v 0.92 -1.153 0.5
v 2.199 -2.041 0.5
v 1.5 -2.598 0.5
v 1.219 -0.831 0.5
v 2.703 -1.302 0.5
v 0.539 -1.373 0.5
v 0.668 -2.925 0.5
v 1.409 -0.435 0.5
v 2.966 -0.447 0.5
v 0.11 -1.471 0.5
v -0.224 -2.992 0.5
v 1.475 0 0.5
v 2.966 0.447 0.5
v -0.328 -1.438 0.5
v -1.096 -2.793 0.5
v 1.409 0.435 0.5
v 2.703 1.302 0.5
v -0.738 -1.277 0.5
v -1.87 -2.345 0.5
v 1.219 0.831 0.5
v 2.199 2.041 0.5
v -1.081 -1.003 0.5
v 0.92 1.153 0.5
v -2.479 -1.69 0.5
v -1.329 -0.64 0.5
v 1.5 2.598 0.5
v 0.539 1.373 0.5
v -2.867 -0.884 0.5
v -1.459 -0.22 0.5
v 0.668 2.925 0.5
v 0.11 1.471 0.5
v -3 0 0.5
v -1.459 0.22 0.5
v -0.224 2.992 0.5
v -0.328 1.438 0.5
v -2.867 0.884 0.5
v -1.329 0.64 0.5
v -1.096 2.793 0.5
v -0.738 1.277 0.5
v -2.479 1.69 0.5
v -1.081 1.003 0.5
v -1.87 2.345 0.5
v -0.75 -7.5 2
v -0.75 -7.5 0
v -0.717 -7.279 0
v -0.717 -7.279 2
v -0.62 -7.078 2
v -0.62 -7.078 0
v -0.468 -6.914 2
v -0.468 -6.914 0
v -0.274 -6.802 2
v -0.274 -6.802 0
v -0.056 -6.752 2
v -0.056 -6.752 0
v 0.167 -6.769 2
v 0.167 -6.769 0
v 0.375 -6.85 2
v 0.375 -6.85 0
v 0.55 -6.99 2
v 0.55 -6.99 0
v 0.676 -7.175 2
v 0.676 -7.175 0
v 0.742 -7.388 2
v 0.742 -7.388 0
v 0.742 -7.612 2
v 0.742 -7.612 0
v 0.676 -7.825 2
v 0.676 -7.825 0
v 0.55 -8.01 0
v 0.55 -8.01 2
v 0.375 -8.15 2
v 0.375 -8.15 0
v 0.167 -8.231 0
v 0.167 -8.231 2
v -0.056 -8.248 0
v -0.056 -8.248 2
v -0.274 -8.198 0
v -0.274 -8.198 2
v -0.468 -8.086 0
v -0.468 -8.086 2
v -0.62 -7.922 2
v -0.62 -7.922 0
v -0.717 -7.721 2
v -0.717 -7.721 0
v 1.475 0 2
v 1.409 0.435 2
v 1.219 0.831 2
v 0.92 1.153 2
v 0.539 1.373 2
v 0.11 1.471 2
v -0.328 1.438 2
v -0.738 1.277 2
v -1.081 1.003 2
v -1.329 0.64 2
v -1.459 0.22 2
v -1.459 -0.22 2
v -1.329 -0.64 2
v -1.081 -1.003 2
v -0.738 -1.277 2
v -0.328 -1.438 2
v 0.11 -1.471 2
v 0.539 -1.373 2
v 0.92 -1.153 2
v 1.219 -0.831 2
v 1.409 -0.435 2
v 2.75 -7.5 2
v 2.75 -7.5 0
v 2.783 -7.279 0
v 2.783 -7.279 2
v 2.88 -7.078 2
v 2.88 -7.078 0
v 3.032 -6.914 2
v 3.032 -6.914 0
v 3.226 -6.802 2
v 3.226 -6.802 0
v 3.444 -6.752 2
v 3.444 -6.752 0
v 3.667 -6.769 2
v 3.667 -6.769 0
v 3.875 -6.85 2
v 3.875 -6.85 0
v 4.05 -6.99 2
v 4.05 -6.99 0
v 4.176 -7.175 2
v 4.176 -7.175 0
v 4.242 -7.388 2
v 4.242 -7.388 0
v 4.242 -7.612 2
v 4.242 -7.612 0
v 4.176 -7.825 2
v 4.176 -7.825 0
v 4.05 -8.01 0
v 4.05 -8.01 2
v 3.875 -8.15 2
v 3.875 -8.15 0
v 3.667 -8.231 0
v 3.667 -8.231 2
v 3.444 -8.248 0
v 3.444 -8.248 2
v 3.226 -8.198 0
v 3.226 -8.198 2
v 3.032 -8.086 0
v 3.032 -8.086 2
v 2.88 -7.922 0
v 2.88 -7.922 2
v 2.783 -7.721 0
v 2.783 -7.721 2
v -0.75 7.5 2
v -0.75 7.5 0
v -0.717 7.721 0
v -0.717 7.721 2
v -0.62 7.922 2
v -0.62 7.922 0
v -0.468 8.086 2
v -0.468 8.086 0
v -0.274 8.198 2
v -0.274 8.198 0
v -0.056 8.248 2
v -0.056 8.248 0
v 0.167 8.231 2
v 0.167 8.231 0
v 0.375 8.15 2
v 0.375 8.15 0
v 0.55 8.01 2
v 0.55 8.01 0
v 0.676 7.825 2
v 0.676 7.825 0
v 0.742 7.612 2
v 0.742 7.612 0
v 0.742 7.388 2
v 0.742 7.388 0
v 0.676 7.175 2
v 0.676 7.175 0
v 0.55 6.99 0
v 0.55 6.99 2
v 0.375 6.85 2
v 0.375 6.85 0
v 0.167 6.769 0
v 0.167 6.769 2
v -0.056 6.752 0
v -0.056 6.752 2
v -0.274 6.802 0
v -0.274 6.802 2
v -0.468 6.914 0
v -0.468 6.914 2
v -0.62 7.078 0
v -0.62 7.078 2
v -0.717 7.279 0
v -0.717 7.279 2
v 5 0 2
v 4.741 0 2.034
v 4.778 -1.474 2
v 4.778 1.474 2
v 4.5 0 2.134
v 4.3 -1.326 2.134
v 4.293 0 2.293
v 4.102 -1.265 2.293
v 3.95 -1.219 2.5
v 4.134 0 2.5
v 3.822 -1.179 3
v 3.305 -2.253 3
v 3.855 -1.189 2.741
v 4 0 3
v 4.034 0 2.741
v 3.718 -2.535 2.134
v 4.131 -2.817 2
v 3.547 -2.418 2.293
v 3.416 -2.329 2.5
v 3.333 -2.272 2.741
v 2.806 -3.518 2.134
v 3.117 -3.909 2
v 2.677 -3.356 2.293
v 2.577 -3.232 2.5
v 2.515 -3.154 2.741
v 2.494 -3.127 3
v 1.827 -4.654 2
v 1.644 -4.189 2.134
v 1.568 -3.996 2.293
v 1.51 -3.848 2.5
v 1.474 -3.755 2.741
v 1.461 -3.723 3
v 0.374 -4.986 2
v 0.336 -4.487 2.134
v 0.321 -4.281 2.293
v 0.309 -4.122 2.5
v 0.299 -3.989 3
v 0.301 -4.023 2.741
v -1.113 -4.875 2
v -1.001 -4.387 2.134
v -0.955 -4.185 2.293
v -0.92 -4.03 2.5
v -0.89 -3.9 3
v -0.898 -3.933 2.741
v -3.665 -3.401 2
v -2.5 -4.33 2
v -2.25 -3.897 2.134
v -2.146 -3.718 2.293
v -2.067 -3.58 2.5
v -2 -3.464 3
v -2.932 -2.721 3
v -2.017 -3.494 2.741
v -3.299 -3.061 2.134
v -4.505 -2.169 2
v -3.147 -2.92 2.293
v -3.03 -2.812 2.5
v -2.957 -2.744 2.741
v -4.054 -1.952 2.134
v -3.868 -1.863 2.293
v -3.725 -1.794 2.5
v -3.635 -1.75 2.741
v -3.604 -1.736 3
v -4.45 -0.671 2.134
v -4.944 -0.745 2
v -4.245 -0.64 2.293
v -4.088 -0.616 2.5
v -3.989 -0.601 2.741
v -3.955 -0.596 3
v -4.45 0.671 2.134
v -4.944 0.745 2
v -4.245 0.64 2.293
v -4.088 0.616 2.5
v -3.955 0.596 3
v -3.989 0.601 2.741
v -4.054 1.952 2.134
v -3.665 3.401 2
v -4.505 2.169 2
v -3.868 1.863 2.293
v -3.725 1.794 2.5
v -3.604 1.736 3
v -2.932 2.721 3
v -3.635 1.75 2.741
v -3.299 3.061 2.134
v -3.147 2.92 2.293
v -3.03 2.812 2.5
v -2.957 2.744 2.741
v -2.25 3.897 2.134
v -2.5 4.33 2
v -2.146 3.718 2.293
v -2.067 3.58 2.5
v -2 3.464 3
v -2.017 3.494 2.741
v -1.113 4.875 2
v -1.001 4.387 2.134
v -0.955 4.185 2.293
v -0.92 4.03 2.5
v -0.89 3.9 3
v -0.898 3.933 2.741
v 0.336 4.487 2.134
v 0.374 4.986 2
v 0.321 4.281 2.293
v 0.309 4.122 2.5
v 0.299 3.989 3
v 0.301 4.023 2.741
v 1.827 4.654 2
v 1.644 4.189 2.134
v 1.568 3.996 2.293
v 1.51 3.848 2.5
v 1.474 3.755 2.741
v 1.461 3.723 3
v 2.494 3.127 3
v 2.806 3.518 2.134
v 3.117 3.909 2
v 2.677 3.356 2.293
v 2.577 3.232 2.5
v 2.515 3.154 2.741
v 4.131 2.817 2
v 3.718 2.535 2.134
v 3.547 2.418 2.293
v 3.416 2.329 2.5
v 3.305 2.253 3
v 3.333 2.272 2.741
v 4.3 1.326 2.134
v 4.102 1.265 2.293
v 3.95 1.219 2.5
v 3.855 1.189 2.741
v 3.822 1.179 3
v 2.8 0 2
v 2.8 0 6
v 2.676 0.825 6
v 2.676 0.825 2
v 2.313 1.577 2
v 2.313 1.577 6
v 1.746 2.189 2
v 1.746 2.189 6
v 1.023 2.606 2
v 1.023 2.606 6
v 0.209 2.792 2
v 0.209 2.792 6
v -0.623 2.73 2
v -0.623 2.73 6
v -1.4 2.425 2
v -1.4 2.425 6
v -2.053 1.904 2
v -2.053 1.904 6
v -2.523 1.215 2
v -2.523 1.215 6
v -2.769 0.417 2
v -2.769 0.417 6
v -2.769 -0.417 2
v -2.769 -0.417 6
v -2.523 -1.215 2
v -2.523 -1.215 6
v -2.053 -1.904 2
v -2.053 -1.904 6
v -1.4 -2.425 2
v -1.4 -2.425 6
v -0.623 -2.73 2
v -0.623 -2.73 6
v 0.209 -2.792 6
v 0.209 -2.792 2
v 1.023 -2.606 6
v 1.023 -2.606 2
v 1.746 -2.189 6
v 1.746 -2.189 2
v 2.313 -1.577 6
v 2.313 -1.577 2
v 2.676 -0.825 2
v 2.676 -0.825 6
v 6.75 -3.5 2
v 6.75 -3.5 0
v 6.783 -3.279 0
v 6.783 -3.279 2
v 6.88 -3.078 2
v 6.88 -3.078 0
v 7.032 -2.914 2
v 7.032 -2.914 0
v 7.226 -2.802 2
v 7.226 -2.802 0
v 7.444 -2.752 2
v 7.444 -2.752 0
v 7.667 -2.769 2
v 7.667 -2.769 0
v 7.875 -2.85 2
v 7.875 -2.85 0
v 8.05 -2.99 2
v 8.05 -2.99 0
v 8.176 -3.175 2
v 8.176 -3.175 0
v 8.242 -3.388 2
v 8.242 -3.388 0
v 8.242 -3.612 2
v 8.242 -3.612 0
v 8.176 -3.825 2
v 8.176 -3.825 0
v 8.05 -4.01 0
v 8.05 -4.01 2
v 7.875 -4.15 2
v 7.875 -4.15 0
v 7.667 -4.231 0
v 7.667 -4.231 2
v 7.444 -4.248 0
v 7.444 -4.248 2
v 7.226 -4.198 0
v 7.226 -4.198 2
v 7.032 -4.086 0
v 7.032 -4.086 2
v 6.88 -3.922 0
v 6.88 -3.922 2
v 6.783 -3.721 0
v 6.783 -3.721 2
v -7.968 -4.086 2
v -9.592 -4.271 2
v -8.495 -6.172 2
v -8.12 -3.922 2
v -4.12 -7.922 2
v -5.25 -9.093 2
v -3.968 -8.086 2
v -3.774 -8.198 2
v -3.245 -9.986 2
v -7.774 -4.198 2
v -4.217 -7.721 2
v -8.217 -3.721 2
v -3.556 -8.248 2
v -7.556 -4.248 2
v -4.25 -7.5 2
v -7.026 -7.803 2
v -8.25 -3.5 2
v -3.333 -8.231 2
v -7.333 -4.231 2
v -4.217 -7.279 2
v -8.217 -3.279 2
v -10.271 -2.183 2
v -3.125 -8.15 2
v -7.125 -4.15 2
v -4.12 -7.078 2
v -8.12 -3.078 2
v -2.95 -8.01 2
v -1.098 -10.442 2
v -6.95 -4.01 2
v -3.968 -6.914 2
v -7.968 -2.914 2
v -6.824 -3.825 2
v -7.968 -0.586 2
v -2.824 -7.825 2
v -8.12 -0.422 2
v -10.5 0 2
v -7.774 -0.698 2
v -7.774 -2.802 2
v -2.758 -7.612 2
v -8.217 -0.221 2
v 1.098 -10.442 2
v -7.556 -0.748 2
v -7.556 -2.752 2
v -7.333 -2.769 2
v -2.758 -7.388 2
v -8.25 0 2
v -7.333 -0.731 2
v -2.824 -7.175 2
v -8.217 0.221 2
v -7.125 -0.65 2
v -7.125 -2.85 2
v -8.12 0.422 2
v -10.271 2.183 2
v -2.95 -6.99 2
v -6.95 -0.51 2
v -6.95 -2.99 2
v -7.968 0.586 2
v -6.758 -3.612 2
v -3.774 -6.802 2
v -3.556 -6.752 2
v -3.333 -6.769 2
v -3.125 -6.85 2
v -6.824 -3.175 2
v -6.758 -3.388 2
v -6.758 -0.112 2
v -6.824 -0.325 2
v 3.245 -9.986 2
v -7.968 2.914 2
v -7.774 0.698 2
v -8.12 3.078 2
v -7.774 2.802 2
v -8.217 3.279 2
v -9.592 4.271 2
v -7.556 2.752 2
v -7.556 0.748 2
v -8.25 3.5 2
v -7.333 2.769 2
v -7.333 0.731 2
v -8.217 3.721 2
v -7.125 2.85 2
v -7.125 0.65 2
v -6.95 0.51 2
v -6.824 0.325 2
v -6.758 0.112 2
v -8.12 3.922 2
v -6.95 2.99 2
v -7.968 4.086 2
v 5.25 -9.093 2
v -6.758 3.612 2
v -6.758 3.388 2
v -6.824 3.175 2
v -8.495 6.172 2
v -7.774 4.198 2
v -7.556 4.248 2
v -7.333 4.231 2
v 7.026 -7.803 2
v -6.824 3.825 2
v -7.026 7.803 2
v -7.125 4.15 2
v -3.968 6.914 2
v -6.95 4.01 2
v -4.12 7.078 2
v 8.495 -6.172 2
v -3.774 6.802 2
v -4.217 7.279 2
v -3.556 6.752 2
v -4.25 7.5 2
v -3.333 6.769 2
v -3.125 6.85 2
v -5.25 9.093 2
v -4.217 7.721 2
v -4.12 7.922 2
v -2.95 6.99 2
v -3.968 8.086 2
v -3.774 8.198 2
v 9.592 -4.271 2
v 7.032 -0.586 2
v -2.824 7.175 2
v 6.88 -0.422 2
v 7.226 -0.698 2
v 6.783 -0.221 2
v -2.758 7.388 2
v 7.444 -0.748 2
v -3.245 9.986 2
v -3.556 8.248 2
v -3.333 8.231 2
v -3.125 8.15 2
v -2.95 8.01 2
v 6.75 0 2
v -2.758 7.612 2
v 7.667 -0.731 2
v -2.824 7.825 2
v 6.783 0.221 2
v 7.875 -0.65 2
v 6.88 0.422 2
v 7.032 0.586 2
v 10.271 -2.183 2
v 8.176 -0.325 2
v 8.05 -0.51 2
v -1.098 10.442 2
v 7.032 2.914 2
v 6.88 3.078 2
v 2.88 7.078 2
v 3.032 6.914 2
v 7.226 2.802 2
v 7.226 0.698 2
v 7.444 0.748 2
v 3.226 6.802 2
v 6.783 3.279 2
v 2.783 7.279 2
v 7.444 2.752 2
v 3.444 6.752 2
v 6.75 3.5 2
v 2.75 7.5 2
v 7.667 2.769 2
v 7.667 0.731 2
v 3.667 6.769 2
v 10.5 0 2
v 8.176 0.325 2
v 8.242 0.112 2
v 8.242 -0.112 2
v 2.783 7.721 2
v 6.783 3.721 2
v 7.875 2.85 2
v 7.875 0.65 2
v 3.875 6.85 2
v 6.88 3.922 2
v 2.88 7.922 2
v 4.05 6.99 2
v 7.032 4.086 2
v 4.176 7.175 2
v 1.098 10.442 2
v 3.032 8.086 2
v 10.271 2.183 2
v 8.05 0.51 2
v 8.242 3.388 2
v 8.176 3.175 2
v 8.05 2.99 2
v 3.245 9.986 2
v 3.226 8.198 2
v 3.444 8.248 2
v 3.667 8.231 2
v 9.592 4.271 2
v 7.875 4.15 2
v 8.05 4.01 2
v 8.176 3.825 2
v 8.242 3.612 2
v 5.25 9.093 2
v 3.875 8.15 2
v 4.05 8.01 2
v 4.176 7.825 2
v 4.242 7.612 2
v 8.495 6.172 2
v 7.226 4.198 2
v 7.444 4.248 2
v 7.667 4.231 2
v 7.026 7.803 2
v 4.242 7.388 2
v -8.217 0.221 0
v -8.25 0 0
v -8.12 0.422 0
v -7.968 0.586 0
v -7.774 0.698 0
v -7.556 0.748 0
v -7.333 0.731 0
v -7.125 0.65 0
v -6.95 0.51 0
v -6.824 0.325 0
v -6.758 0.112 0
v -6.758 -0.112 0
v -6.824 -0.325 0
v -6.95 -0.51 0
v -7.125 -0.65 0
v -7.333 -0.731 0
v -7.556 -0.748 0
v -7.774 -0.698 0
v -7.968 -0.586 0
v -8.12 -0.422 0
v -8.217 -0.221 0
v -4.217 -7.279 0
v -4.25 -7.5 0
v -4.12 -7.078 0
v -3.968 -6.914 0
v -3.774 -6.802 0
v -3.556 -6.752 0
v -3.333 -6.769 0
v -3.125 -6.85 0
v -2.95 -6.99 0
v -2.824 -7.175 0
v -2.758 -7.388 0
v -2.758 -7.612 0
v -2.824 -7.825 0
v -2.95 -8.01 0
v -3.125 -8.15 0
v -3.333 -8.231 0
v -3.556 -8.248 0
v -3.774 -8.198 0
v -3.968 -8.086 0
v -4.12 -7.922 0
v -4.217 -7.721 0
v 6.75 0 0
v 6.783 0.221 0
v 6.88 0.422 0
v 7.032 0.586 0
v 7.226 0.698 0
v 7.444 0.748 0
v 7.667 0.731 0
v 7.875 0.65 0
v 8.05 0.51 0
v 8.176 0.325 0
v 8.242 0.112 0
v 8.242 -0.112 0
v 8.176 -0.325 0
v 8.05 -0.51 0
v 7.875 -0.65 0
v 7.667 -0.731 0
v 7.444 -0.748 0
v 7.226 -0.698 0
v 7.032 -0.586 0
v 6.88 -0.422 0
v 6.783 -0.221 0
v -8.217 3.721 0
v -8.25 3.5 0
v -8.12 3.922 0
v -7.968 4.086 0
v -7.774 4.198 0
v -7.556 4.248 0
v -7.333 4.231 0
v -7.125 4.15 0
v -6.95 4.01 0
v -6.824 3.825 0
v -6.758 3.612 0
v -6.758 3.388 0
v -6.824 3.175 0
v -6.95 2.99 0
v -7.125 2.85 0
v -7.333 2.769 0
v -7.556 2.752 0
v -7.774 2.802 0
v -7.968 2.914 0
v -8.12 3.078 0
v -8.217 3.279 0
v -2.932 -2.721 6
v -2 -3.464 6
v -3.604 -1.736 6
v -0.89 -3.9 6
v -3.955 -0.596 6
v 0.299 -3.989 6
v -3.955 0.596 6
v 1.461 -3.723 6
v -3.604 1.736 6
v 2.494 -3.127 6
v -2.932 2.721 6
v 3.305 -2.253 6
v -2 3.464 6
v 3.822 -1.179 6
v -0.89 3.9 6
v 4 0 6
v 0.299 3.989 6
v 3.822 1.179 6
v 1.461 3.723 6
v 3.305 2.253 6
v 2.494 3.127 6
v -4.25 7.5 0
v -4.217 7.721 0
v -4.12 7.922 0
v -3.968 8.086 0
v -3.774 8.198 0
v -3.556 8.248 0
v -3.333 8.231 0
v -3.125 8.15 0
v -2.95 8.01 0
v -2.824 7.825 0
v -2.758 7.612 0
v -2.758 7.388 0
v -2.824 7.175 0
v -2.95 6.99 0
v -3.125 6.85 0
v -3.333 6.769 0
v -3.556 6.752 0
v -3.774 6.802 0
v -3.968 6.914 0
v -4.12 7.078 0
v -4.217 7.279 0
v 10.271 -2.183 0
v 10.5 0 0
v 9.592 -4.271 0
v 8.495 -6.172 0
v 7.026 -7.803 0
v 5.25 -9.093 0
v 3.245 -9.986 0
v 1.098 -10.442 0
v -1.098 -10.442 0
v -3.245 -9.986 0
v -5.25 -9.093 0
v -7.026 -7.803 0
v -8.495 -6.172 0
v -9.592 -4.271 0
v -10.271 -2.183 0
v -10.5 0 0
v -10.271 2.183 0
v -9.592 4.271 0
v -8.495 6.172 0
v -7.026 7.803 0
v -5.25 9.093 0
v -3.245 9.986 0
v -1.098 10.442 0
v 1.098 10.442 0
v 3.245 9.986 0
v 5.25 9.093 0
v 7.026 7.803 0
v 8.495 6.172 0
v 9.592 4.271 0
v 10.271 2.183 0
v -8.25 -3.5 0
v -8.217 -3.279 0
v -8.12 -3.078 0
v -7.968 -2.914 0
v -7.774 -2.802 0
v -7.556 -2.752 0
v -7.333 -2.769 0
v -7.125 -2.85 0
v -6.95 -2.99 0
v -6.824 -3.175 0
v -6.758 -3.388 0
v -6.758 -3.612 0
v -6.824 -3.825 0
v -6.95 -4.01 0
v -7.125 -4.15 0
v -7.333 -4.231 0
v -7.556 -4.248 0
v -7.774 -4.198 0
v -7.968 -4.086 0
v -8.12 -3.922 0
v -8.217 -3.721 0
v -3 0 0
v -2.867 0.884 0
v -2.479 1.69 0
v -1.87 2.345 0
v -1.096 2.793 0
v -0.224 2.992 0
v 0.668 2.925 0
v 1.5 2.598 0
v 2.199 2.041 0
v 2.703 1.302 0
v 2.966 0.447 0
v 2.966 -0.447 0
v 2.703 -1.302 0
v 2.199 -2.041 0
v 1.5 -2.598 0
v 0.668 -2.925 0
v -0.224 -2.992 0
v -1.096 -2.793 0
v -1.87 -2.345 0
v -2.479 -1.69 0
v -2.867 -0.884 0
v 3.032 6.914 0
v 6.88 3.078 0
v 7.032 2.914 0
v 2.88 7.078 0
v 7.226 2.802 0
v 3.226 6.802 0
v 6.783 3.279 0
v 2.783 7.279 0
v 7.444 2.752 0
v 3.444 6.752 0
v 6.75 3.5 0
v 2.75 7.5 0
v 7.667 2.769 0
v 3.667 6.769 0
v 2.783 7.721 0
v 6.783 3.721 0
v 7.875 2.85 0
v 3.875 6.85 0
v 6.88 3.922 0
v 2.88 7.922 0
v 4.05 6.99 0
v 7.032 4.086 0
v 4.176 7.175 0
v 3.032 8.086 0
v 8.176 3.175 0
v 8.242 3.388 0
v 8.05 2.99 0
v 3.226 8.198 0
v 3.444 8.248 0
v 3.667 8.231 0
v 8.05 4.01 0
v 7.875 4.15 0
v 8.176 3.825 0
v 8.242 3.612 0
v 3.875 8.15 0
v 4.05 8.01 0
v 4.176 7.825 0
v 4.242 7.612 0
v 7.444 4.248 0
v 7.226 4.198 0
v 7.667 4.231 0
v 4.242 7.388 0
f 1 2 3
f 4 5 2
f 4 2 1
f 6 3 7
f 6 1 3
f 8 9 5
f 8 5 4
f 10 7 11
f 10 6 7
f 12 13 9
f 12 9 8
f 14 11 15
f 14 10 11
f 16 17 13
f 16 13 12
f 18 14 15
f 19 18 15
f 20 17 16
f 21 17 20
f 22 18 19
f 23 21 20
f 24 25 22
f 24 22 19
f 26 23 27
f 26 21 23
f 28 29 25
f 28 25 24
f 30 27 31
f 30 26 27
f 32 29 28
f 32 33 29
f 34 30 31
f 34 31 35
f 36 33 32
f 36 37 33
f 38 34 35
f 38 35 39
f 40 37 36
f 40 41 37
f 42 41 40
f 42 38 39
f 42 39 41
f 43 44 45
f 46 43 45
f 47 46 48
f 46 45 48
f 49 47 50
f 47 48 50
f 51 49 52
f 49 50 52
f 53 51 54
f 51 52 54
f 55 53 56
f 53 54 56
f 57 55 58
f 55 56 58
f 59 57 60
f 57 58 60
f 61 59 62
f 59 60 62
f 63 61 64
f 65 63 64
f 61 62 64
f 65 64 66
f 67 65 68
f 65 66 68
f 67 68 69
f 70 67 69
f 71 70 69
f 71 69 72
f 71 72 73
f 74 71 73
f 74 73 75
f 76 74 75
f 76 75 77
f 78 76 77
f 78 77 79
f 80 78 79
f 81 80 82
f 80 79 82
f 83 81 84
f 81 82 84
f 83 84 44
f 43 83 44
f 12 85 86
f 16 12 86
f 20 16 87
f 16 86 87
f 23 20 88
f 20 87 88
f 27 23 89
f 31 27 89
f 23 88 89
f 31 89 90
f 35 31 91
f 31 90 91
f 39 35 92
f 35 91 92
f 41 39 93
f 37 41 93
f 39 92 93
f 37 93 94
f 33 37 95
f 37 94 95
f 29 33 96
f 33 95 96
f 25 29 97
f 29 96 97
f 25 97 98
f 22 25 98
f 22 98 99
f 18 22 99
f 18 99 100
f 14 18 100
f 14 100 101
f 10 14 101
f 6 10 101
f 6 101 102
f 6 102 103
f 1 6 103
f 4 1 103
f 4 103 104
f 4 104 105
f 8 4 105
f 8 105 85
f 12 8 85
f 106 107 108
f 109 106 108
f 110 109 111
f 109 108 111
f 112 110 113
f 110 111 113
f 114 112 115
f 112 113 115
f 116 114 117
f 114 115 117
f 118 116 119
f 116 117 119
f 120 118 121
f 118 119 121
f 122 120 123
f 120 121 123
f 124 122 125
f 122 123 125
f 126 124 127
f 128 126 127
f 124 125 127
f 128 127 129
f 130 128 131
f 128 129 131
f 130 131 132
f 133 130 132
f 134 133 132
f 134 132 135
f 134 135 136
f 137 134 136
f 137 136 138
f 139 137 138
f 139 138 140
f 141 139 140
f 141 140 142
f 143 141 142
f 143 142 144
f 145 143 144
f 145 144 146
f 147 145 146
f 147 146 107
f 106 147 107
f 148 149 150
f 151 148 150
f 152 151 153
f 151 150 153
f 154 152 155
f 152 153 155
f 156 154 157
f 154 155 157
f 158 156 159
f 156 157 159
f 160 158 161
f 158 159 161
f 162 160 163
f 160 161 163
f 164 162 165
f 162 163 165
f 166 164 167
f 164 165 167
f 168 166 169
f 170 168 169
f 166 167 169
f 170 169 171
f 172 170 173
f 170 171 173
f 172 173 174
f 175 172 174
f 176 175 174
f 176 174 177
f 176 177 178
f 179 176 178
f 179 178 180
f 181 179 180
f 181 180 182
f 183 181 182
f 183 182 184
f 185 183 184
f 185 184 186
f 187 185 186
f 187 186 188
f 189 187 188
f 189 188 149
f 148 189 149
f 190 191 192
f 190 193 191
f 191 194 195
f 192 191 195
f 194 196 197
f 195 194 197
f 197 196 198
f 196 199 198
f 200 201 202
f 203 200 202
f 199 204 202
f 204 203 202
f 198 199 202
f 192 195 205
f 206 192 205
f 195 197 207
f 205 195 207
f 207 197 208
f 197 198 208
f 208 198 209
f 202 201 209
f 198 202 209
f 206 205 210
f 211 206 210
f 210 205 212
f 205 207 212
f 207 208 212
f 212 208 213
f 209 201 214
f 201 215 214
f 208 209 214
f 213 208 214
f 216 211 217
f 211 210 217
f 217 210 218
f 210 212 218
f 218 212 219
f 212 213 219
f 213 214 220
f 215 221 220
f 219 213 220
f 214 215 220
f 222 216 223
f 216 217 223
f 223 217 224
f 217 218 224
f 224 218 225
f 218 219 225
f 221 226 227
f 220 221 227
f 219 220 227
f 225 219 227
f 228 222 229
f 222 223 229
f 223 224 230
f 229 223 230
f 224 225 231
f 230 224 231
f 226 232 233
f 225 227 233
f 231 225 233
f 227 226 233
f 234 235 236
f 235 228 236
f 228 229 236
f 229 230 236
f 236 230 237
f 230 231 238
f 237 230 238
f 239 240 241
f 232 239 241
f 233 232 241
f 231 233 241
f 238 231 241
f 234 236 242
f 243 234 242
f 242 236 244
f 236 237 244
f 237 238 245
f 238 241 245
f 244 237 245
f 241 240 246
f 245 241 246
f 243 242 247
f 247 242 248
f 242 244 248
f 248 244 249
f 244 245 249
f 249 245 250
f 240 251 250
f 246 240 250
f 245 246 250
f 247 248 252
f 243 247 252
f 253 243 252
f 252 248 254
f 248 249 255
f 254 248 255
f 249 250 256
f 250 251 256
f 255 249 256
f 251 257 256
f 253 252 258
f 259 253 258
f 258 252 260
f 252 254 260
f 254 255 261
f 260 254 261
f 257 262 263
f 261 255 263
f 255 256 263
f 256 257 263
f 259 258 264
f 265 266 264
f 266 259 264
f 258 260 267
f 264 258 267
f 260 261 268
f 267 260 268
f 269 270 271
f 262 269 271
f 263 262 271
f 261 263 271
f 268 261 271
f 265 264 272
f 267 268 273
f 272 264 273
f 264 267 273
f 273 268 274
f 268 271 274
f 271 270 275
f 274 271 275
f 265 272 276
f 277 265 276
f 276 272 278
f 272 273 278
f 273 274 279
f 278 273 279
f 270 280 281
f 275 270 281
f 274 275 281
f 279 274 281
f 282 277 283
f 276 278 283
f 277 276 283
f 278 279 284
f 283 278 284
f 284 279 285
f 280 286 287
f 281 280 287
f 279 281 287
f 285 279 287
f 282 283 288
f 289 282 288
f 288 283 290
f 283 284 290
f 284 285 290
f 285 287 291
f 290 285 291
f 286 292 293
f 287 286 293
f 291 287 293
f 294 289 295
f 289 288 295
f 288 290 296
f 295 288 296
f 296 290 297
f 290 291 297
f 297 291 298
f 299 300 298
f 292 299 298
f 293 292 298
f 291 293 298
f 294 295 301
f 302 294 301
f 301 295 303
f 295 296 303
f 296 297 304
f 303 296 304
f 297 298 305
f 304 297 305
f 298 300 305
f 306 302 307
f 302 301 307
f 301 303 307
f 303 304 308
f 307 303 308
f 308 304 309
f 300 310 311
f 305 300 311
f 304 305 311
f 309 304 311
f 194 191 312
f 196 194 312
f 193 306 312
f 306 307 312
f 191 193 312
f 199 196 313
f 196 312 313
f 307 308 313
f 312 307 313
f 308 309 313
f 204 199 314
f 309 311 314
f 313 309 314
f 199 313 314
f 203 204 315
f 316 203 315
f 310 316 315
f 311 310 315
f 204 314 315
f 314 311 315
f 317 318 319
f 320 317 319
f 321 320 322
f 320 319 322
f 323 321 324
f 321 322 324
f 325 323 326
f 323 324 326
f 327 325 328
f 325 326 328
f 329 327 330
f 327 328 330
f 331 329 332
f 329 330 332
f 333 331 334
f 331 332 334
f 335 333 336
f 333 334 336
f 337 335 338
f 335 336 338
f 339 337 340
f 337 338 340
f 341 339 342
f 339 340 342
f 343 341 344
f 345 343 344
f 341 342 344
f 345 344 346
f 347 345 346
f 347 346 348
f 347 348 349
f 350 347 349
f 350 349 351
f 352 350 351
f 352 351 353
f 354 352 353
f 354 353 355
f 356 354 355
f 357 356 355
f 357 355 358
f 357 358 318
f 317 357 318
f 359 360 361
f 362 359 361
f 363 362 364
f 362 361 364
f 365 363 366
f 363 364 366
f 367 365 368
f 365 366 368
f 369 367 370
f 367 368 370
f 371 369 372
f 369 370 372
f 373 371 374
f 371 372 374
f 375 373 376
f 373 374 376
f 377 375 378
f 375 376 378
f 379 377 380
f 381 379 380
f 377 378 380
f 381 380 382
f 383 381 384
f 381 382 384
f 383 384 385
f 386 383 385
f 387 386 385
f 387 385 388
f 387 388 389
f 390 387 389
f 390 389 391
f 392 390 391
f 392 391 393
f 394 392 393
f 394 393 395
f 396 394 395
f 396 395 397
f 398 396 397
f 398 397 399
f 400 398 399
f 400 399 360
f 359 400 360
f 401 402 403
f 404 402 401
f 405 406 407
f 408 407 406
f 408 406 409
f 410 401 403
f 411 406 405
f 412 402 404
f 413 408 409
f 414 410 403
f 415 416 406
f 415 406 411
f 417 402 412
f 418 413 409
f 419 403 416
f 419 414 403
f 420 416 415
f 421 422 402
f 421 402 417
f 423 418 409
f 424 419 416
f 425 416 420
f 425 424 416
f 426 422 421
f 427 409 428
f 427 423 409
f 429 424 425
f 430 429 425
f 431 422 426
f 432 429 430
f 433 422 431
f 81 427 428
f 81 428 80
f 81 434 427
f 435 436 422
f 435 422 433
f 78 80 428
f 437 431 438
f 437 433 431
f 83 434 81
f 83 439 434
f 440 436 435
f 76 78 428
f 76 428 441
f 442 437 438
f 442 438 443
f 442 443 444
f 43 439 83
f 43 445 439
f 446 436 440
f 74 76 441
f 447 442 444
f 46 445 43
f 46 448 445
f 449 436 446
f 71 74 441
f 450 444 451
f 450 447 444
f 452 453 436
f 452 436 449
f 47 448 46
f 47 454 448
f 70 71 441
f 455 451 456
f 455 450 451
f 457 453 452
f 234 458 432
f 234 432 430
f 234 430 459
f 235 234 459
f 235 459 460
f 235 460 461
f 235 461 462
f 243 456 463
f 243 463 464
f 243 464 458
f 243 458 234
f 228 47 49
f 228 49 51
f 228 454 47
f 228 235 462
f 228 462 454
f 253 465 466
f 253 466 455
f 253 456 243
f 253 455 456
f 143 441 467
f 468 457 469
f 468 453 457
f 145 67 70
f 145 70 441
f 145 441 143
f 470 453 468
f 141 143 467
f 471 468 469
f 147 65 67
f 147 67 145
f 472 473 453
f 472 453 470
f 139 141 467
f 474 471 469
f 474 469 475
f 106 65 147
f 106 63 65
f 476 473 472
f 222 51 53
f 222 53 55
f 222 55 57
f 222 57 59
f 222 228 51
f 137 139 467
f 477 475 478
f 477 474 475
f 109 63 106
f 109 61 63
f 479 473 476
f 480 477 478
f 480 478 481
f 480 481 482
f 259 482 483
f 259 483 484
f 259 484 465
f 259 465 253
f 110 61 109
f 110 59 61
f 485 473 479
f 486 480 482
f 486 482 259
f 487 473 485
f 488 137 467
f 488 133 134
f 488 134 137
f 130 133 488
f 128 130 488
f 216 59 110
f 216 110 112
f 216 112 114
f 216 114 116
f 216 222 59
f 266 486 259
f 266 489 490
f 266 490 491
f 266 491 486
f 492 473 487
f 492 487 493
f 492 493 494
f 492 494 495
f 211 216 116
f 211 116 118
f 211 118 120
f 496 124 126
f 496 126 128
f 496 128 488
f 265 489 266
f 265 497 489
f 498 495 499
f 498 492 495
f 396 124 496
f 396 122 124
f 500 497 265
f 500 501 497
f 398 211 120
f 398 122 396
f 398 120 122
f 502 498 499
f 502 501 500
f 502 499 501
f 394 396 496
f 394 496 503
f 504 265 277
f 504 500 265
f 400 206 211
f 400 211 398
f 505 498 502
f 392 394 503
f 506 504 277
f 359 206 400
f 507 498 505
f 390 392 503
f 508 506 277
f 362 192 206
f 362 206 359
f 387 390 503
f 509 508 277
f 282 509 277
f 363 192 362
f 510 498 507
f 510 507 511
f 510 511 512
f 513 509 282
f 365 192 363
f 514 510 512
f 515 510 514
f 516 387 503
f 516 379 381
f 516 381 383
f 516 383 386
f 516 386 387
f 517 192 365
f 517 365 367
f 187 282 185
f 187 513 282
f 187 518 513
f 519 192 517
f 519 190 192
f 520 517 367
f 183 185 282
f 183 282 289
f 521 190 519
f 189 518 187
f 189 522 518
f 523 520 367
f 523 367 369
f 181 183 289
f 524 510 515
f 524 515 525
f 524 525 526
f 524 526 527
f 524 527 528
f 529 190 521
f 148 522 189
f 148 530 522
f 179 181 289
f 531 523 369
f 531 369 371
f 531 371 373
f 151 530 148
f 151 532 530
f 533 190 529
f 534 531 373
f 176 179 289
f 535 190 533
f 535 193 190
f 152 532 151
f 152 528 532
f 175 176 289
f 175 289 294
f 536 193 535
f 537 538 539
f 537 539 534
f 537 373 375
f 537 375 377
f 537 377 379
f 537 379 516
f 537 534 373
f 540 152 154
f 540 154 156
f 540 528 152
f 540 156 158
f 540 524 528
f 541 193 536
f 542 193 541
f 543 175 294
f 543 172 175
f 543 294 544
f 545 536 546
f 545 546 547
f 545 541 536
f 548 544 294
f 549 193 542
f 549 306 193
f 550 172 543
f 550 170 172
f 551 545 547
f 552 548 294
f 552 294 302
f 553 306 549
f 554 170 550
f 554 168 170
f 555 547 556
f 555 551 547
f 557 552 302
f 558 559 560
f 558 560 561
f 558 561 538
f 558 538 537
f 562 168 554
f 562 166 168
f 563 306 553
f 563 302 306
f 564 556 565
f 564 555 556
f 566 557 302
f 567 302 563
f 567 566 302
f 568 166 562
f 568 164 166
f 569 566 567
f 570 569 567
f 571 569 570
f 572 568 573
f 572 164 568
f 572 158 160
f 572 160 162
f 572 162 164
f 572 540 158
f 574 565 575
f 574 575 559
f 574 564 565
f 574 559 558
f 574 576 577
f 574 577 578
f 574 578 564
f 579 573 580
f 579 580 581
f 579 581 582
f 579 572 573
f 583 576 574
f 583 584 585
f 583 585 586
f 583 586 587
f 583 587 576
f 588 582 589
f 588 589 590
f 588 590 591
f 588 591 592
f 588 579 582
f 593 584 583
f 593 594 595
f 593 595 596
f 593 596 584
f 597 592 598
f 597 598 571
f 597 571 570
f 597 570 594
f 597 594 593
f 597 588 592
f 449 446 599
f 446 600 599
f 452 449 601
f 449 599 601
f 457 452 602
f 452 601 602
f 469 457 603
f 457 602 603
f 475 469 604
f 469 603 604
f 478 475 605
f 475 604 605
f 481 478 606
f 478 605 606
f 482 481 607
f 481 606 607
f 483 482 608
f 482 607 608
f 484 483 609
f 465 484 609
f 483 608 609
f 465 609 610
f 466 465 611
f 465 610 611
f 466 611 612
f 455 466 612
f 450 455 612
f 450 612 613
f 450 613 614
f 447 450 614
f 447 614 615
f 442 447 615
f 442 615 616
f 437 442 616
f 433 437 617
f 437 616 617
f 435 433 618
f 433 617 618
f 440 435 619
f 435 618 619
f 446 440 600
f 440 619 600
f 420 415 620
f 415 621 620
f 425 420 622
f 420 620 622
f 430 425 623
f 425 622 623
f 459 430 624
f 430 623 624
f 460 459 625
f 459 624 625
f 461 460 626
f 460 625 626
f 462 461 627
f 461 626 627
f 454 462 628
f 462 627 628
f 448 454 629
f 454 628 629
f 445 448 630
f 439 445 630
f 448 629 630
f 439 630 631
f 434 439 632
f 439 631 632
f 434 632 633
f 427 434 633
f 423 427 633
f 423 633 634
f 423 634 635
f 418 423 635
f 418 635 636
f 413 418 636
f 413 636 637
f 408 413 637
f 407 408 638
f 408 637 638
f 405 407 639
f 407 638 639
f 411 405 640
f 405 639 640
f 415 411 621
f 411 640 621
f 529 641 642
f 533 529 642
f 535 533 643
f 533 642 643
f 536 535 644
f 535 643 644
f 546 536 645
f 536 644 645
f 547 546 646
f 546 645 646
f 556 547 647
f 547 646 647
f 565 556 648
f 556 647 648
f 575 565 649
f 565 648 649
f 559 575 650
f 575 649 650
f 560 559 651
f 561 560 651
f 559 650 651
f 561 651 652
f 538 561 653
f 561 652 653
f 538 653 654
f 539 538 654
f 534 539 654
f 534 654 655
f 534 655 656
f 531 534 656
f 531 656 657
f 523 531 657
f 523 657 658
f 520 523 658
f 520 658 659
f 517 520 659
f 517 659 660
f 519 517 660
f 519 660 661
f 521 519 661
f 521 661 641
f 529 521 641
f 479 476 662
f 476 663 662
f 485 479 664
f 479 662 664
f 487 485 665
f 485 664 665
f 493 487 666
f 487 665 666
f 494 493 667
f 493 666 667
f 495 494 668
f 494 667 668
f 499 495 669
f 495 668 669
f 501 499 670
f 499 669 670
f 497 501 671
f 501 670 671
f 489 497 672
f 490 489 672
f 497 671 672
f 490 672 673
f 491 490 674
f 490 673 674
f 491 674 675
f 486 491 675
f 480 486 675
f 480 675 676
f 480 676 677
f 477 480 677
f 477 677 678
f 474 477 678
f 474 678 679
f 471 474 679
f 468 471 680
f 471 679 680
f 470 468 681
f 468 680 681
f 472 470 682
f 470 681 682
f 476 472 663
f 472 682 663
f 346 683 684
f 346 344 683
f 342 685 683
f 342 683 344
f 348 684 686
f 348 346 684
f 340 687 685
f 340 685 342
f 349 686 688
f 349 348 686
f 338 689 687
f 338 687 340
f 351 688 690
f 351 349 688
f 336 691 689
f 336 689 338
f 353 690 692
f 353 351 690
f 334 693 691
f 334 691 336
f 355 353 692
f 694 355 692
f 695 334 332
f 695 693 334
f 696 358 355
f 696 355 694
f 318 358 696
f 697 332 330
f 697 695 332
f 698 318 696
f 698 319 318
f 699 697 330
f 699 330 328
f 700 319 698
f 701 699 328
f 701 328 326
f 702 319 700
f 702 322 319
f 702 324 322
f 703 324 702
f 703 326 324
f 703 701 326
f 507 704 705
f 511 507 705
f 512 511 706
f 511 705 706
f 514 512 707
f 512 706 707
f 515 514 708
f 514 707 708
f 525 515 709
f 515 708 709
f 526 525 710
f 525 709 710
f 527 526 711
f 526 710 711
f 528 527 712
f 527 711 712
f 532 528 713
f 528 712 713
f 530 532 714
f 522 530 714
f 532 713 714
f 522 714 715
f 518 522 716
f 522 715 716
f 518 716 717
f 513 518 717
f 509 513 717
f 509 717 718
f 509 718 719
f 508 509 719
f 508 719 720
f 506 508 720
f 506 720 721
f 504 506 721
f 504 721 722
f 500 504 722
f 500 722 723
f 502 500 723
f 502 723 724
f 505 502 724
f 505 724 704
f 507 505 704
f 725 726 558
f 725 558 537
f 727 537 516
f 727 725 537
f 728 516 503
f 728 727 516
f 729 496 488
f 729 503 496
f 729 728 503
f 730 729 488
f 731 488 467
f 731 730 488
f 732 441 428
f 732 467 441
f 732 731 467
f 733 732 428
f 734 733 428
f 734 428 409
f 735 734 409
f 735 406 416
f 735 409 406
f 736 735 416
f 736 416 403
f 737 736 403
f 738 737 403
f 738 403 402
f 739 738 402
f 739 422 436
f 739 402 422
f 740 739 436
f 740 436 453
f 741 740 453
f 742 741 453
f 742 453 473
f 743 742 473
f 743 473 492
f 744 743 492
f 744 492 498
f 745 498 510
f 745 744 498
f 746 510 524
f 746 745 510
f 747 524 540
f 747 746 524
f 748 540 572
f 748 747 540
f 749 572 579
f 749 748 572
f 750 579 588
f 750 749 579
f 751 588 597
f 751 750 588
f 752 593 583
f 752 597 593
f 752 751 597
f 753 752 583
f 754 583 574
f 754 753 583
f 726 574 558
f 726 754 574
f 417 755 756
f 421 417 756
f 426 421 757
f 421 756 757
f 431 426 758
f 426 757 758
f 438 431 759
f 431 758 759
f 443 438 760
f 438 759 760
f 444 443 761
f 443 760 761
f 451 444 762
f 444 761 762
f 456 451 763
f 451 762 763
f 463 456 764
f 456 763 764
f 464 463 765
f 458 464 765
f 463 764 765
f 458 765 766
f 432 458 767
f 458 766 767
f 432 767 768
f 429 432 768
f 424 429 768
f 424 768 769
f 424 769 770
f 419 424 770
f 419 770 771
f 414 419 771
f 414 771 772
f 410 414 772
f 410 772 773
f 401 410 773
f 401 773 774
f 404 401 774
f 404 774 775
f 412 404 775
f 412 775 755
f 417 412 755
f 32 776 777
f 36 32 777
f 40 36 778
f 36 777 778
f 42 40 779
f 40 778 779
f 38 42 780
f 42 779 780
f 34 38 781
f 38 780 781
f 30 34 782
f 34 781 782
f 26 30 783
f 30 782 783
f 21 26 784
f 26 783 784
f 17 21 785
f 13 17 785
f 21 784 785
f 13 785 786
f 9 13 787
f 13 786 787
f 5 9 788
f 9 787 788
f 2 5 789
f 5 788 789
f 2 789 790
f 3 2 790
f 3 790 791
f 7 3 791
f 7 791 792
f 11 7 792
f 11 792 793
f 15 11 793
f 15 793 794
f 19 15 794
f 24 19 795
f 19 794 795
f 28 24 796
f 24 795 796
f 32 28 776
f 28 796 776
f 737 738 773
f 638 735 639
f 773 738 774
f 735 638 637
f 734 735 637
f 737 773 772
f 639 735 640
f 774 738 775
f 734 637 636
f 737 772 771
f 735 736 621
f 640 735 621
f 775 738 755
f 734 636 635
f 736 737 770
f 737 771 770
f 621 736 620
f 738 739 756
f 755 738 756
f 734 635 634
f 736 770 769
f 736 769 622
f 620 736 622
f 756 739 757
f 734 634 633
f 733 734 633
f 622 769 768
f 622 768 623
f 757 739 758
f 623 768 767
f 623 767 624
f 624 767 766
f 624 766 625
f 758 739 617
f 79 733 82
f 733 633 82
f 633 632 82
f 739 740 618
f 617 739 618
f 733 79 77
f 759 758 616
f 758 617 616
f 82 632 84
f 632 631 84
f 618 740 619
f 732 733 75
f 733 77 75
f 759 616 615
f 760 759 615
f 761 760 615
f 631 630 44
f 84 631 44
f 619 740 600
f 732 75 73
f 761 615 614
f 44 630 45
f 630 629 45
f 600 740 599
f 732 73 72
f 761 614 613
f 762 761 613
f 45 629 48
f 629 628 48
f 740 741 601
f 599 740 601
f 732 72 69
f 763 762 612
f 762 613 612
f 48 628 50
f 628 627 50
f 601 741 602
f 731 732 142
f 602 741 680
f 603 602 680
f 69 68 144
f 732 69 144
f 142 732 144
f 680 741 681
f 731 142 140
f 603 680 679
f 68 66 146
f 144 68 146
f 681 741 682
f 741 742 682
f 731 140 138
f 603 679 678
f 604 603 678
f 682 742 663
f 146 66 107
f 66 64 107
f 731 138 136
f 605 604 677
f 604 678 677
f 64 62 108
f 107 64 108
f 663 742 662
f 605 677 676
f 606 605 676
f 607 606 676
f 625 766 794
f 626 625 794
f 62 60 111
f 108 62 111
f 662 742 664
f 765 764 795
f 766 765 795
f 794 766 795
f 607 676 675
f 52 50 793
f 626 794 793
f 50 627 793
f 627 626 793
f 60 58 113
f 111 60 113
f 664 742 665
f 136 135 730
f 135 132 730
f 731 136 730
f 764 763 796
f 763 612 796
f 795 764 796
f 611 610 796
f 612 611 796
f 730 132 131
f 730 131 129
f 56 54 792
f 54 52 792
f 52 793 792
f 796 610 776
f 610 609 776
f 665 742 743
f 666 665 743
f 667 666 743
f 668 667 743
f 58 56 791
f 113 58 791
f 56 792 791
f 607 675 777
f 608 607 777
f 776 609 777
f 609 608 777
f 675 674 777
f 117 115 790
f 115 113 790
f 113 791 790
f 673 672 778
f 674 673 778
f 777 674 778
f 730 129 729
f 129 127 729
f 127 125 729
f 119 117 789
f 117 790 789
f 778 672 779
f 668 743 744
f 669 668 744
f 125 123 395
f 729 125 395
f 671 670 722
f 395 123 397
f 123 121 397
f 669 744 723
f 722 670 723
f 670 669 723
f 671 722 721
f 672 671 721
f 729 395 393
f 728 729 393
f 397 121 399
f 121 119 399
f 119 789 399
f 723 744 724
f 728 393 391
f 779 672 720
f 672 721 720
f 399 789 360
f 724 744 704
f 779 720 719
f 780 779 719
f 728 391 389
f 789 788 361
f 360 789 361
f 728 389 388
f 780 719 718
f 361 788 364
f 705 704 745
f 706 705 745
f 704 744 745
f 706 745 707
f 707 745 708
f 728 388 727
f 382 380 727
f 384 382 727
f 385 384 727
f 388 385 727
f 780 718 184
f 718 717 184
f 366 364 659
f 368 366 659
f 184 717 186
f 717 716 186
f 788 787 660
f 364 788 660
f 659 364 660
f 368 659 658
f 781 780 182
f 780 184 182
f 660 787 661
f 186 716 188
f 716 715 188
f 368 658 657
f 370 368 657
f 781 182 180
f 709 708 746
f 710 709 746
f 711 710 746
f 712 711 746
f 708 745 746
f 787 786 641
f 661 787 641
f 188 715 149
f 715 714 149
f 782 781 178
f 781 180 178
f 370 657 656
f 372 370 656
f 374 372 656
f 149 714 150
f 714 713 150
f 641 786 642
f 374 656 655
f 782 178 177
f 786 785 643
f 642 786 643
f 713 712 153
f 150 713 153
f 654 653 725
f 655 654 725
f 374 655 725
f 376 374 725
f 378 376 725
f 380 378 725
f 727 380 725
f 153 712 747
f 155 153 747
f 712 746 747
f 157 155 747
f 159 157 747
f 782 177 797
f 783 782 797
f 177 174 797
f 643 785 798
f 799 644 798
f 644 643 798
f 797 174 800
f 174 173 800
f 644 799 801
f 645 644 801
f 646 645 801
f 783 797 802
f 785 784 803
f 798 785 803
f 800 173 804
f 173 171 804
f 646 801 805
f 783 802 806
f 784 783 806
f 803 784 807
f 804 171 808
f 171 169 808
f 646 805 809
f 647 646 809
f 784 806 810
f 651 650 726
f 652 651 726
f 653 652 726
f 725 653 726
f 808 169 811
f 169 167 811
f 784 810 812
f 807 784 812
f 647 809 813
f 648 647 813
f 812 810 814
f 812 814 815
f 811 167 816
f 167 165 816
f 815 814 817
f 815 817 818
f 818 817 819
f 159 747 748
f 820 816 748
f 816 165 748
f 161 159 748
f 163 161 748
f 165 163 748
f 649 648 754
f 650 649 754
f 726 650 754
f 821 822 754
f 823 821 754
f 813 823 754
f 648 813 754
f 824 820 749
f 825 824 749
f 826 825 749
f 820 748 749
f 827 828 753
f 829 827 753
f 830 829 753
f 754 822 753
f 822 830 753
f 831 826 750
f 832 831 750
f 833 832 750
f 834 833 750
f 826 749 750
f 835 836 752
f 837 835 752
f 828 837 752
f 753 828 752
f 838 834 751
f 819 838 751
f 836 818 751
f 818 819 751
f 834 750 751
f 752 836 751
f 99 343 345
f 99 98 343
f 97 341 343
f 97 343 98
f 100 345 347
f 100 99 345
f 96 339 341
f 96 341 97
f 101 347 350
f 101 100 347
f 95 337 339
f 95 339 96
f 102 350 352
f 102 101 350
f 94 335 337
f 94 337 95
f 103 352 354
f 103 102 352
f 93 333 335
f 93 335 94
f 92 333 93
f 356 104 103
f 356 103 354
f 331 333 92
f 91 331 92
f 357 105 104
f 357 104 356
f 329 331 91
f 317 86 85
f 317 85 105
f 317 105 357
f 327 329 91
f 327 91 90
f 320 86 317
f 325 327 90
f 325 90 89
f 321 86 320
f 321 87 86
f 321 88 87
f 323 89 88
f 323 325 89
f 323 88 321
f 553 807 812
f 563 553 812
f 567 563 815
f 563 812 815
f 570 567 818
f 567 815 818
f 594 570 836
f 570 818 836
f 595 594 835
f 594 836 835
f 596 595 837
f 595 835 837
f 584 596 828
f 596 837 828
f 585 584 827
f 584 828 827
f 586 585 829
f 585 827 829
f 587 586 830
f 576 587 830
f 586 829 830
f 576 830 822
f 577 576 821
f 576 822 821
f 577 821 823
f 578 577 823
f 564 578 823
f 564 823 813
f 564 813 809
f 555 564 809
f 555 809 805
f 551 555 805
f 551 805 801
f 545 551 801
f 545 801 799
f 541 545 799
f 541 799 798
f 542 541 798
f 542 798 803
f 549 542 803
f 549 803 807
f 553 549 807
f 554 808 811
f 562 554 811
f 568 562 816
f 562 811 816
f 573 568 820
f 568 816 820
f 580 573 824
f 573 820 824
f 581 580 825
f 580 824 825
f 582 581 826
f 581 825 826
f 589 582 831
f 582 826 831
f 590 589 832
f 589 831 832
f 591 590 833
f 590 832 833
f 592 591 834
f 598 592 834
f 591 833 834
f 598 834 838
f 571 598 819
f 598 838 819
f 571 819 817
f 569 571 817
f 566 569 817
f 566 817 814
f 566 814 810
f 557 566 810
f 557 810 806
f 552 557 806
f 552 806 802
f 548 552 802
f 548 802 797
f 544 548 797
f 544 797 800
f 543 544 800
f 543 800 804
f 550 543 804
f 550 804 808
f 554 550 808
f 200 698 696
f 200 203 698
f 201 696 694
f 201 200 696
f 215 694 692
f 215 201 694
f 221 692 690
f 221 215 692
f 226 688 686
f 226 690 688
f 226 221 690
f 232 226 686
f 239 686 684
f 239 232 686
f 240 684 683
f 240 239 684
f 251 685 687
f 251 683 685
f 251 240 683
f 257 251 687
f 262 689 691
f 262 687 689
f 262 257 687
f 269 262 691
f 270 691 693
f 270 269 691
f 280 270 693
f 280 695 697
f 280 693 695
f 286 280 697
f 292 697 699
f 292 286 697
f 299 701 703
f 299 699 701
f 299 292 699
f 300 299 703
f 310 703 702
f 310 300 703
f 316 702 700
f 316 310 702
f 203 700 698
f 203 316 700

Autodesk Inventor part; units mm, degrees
ref_plane "YZ Plane" through (0, 0, 0) normal (1, 0, 0) x (0, 1, 0)
ref_plane "XZ Plane" through (0, 0, 0) normal (0, 1, 0) x (-1, 0, 0)
ref_plane "XY Plane" through (0, 0, 0) normal (0, 0, 1) x (1, 0, 0)
sketch "Boceto1" plane through (0, 0, 0) normal (0, 0, 1) x (1, 0, 0)
  circle A0 centre (0, 0) radius 10.5
  dimension "d0" = 21
extrude "Extrusión1" add sketch "Boceto1" along normal blind 2
sketch "Boceto2" plane through (0, 0, 2) normal (0, 0, 1) x (1, 0, 0)
  circle A0 centre (0, 0) radius 4
  dimension "d4" = 8
extrude "Extrusión2" add sketch "Boceto2" along normal blind 4
fillet "Empalme1" radius 1 1 edges at (-4, 0, 2)
sketch "Boceto3" plane through (0, 0, 6) normal (0, 0, 1) x (1, 0, 0)
  circle A0 centre (0, 0) radius 4 projected
  circle A1 centre (0, 0) radius 2.8
  dimension "d8" = 5.6
extrude "Extrusión3" cut sketch "Boceto3" against normal blind 4 contours A1
sketch "Boceto4" plane through (0, 0, 2) normal (0, 0, 1) x (1, 0, 0)
  circle A0 centre (0, 0) radius 1.475
  dimension "d11" = 2.95
extrude "Extrusión4" cut sketch "Boceto4" against normal up to surface (2 mm away)
sketch "Boceto5" plane through (0, 0, 0) normal (0, 0, -1) x (-1, 0, 0)
  circle A0 centre (0, 0) radius 1.475 projected
  circle A1 centre (0, 0) radius 3
  dimension "d14" = 6
extrude "Extrusión5" cut sketch "Boceto5" against normal blind 0.5
sketch "Boceto6" plane through (0, 0, 0) normal (0, 0, -1) x (-1, 0, 0)
  line L0 (11.1976, -7.5) -> (-9.8806, -7.5)
  circle A0 centre (0, -7.5) radius 0.75
  circle A1 centre (3.5, -7.5) radius 0.75
  circle A2 centre (-3.5, -7.5) radius 0.75
  circle A3 centre (7.5, 0) radius 0.75
  circle A4 centre (7.5, 3.5) radius 0.75
  circle A5 centre (7.5, -3.5) radius 0.75
  circle A6 centre (0, 7.5) radius 0.75
  circle A7 centre (-3.5, 7.5) radius 0.75
  circle A8 centre (3.5, 7.5) radius 0.75
  circle A9 centre (-7.5, 0) radius 0.75
  circle A10 centre (-7.5, -3.5) radius 0.75
  circle A11 centre (-7.5, 3.5) radius 0.75
  point P0 (0, 0)
  dimension "d17" = 7.5
  dimension "d18" = 1.5
  dimension "d19" = 3.5
  dimension "d20" = 3.5
  dimension "d23" = 360
extrude "Extrusión6" cut sketch "Boceto6" against normal through all
properties part number "horn"
